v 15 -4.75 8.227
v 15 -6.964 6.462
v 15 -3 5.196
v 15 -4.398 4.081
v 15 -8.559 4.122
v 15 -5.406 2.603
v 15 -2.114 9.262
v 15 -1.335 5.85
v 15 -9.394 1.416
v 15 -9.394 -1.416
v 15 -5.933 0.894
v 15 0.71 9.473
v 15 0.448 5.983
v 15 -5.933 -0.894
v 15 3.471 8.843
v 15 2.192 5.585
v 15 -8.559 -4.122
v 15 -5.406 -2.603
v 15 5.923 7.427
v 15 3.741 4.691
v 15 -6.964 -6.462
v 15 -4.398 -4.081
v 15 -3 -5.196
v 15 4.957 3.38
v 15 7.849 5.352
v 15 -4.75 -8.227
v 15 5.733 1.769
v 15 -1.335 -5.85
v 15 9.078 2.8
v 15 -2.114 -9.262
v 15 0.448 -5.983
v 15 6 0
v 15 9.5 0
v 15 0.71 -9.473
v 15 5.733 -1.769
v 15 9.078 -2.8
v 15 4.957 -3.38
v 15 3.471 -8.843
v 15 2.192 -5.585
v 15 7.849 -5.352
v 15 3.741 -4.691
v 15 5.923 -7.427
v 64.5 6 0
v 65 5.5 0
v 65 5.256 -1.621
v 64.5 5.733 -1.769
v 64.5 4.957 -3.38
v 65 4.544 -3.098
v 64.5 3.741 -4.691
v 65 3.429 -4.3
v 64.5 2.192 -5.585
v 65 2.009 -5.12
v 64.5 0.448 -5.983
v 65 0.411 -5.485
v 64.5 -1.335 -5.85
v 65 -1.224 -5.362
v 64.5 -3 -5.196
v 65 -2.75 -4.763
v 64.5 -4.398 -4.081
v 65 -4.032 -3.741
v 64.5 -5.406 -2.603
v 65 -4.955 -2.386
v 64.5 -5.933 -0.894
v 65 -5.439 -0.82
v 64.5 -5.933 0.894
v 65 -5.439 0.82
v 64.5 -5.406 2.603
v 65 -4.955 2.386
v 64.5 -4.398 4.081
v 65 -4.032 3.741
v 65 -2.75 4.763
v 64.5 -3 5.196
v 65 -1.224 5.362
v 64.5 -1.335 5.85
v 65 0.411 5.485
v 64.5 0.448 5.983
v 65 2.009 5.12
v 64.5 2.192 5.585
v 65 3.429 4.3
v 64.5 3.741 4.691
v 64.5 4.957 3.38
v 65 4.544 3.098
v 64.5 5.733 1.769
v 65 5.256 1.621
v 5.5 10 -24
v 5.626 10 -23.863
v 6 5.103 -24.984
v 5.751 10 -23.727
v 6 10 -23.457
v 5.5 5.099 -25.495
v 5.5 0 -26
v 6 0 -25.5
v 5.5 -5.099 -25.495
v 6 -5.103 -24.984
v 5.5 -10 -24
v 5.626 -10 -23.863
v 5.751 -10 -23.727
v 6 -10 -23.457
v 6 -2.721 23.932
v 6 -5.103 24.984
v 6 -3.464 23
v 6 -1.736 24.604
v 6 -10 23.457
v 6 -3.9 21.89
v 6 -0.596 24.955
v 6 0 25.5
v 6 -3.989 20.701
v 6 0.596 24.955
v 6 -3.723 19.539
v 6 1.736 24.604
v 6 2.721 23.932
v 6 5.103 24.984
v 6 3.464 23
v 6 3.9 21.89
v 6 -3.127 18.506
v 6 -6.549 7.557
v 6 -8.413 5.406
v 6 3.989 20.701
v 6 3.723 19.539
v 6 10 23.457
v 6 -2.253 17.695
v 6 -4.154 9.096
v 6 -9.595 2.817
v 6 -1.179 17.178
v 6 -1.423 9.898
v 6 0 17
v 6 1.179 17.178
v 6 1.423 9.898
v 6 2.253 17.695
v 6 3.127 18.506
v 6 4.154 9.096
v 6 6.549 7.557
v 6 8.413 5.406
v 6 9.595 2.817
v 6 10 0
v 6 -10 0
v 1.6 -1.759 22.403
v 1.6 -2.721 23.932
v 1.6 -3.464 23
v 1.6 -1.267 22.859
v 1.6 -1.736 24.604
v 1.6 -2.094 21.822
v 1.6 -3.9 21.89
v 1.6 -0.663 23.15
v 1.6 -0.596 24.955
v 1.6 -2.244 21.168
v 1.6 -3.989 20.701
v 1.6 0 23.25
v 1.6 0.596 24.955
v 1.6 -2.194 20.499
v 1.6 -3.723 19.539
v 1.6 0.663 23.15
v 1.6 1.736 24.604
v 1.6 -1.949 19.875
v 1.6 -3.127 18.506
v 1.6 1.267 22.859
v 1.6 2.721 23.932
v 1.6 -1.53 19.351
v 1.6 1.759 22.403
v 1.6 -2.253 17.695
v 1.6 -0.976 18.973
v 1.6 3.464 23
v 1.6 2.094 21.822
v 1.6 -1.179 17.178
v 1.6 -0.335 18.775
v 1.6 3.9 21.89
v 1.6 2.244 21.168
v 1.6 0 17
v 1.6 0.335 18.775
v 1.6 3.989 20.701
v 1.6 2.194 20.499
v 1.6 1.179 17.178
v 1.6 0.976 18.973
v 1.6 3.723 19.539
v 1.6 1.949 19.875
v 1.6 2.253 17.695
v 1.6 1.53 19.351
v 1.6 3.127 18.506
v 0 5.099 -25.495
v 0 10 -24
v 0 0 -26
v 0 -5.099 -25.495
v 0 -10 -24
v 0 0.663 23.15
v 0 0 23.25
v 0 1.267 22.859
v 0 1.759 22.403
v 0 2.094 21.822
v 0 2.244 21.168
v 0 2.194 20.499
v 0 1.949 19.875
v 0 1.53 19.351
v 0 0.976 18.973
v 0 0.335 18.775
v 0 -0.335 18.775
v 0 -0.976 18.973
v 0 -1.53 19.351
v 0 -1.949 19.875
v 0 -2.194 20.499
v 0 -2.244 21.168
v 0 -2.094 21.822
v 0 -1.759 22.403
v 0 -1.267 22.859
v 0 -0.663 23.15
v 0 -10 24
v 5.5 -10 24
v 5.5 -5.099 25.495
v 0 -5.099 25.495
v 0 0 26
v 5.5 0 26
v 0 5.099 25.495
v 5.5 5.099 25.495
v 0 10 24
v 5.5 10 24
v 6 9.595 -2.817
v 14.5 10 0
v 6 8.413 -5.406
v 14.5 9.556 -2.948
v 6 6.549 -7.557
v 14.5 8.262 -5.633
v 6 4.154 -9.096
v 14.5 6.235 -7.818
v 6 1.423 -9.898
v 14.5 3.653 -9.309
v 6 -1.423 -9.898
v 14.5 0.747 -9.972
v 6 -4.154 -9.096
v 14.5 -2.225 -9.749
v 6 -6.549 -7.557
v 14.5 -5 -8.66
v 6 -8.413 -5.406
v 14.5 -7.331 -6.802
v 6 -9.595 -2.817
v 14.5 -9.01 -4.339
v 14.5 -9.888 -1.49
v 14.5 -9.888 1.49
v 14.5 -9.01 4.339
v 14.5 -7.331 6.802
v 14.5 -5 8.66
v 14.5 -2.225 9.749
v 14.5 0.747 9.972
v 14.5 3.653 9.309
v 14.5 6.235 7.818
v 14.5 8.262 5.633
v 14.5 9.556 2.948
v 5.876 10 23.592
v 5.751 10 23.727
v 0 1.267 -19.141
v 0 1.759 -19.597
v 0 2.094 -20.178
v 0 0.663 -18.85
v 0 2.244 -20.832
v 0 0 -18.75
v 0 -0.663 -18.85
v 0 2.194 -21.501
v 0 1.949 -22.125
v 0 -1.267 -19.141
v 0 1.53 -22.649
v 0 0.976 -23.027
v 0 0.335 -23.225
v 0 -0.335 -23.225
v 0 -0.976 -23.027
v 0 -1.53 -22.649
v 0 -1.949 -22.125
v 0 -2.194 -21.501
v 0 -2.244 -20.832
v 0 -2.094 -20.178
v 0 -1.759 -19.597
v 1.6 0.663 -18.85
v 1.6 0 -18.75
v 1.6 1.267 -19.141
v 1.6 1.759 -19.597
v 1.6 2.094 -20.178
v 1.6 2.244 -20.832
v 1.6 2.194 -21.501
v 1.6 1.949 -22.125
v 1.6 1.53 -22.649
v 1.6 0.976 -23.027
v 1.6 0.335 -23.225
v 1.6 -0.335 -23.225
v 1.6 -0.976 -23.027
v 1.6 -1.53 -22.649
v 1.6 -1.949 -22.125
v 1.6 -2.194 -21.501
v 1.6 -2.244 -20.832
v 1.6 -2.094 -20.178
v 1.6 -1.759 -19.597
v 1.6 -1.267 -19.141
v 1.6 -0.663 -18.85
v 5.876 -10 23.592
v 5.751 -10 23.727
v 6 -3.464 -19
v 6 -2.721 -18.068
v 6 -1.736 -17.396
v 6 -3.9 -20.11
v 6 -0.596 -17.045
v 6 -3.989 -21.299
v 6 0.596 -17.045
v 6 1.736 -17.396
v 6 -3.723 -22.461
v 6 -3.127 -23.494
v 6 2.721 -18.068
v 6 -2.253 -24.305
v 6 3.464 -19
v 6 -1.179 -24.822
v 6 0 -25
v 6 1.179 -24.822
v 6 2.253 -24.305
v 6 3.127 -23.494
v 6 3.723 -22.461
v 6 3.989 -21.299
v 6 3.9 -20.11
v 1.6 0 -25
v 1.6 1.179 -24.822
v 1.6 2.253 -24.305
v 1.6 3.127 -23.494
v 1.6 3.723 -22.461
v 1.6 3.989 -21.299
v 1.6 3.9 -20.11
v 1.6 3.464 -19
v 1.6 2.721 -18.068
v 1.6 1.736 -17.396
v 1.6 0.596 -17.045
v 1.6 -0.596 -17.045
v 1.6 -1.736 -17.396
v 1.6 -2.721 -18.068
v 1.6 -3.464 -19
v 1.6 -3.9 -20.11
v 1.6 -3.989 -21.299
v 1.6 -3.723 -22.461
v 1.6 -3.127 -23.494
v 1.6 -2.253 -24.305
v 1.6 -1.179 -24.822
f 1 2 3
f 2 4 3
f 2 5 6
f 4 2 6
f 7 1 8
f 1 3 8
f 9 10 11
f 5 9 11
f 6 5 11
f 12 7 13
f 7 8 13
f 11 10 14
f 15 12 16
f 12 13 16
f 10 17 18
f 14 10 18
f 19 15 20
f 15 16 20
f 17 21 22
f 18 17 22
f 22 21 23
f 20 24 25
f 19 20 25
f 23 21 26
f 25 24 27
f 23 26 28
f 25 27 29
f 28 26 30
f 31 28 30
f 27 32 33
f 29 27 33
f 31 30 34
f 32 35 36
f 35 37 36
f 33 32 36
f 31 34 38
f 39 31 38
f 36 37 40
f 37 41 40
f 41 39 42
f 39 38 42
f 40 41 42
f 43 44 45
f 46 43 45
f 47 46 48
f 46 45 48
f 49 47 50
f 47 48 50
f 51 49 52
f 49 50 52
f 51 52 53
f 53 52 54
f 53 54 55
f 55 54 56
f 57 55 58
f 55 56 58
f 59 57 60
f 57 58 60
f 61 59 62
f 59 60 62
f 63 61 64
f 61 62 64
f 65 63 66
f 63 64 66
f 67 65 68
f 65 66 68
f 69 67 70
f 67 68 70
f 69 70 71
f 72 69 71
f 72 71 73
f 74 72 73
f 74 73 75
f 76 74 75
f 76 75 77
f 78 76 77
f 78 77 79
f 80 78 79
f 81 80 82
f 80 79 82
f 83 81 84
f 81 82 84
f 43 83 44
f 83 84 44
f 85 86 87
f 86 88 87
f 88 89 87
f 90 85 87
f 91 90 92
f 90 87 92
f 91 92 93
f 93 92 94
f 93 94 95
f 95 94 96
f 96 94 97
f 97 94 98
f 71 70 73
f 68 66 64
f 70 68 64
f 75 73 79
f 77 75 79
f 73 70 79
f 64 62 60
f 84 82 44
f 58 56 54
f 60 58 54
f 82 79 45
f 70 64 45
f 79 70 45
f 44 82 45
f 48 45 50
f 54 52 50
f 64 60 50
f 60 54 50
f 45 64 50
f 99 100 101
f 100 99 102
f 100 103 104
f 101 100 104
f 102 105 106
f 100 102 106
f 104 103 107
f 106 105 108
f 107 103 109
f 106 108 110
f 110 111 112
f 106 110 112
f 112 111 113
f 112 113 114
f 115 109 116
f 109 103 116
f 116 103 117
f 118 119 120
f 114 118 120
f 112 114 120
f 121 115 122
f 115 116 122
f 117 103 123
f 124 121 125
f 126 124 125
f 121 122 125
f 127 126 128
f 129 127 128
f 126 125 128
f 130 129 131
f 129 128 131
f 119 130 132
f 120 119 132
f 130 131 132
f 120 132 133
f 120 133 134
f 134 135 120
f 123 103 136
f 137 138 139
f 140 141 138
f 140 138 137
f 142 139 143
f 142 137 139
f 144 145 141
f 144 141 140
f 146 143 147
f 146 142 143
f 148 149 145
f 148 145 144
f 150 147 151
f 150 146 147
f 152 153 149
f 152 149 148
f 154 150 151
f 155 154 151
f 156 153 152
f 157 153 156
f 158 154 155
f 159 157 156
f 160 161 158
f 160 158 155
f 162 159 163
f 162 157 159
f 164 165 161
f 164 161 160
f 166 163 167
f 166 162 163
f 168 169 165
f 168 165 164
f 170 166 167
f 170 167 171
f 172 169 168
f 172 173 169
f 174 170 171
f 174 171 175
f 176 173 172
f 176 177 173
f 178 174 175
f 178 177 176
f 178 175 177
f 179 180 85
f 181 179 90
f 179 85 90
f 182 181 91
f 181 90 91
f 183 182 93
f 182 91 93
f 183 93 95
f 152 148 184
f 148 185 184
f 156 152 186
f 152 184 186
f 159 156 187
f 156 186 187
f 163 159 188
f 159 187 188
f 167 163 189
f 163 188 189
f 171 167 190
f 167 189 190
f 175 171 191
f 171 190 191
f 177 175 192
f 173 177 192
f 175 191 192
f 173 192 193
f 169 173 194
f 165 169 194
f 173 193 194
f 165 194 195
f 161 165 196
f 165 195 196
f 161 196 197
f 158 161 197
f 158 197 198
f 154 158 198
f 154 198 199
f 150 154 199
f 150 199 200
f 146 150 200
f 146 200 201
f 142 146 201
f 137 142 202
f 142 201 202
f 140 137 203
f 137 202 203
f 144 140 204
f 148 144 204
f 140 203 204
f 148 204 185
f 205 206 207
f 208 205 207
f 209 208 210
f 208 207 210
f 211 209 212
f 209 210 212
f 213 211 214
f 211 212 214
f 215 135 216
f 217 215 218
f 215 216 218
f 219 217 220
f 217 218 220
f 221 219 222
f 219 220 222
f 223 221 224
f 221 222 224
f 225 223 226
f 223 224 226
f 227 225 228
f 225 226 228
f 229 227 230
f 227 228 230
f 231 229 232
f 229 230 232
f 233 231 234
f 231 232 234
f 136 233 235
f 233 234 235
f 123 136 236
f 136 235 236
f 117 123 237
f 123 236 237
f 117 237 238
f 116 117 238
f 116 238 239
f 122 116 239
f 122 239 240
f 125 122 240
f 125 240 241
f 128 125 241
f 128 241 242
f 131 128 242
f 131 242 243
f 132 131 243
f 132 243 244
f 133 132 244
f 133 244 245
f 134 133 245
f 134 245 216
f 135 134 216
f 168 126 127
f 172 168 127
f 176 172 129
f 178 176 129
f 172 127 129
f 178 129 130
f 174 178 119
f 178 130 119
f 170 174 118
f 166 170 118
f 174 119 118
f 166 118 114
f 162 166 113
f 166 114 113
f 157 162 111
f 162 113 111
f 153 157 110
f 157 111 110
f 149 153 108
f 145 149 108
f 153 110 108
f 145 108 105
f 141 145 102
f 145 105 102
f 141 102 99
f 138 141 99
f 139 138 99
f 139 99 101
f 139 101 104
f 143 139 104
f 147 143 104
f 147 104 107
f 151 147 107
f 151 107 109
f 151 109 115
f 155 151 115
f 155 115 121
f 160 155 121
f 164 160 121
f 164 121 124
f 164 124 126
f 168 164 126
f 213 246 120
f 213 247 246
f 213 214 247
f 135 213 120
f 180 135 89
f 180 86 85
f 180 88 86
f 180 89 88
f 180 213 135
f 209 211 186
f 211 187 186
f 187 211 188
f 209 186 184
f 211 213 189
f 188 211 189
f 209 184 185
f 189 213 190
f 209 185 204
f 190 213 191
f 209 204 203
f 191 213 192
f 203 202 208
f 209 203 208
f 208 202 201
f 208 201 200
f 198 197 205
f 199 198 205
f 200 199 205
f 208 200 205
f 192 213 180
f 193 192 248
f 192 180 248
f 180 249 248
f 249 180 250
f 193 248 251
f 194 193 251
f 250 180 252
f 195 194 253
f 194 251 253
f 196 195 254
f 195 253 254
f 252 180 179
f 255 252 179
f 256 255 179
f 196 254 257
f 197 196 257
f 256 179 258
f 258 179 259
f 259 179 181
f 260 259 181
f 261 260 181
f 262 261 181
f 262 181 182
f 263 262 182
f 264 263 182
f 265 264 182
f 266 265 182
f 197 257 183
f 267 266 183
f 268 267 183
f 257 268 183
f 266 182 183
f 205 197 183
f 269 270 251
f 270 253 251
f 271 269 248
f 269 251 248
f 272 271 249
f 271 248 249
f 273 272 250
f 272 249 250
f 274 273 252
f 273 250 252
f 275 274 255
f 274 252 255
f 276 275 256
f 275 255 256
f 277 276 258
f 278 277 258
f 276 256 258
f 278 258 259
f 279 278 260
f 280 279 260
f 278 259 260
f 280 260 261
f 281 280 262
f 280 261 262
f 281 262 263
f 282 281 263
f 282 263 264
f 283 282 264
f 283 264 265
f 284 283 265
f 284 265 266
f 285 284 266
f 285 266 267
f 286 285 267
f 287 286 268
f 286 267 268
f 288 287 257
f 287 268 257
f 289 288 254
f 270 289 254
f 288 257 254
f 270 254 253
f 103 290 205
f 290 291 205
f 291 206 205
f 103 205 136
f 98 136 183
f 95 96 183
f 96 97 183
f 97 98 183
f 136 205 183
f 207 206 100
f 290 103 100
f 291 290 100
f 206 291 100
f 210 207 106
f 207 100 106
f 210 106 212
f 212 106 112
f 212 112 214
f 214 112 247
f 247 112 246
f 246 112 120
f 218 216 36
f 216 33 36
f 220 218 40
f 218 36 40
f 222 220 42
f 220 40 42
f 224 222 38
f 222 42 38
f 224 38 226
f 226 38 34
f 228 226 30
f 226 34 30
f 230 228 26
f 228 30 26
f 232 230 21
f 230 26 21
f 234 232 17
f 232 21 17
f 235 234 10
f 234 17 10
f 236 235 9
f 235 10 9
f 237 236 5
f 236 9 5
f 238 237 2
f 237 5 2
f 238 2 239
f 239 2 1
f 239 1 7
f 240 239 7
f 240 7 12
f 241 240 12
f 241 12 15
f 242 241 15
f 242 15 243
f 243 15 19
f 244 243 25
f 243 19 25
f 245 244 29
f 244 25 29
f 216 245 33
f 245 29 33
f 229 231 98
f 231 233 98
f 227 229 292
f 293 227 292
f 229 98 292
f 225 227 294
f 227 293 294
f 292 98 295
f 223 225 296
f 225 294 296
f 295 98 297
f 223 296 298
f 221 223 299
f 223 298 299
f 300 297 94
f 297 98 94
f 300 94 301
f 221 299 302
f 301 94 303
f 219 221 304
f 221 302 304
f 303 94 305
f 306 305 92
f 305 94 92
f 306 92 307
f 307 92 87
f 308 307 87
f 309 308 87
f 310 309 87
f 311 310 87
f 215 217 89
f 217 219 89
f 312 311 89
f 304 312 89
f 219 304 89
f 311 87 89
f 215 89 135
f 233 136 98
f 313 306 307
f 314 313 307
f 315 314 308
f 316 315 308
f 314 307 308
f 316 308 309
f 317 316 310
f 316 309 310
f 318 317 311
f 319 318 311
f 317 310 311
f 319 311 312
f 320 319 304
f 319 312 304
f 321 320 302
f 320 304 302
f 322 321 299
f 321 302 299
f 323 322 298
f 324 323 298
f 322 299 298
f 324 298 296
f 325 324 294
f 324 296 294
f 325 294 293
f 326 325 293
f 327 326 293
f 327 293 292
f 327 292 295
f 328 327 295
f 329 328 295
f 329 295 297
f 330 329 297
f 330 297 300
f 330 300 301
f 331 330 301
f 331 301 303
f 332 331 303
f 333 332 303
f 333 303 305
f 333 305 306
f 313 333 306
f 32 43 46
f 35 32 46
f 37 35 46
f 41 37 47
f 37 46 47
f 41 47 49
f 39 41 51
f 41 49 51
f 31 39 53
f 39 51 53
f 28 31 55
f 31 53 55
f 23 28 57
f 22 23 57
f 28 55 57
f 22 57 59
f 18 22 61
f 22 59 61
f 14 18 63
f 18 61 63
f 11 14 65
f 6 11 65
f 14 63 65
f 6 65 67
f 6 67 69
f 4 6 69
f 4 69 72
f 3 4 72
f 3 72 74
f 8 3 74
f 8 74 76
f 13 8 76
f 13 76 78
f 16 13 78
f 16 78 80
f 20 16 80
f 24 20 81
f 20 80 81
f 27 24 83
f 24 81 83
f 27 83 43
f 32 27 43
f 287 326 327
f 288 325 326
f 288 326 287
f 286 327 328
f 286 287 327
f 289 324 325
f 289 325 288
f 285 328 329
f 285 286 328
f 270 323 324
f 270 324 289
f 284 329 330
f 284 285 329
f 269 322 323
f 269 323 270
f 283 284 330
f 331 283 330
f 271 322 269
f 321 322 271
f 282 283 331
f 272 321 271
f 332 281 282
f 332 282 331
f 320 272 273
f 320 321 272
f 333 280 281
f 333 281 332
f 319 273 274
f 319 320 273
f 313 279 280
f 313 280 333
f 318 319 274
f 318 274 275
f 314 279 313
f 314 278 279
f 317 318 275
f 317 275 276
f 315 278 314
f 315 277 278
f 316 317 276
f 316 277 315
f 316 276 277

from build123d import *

# Parameters (mm, degrees)
CHANFREIN1_SIZE                                    = 0.5
CHAMBRAGE_POUR_VIS_T_TE_HEXAGONALE_M41_D           = 4.5
CHAMBRAGE_POUR_VIS_T_TE_HEXAGONALE_M41_CBORE_D     = 8
CHAMBRAGE_POUR_VIS_T_TE_HEXAGONALE_M41_CBORE_DEPTH = 4.4
ENL_V_MAT_EXTRU_2_DEPTH                            = 75.679314405
CHANFREIN3_SIZE                                    = 0.5


with BuildPart() as part:
    # Esquisse1 → Révolution1 (revolve)
    with BuildSketch(Plane.XY):
        Polygon((15, 6), (65, 6), (65, 0), (0, 0), (0, 26), (6, 26), (6, 10), (15, 10), align=None)
    revolve(axis=Axis((65, 0, 0), (-1, 0, 0)))

    # Chanfrein1
    chanfrein1_edges = [part.edges().sort_by_distance(p)[0] for p in [
        (6, -26, 0),
        (15, -10, 0),
    ]]
    chamfer(chanfrein1_edges, length=CHANFREIN1_SIZE)

    # Chambrage pour vis à tête hexagonale M41 (through all)
    with Locations(Plane(origin=(6, 0, 0), x_dir=(0, 0, -1), z_dir=(1, 0, 0))):
        with Locations((-21, 0), (21, 0)):
            CounterBoreHole(CHAMBRAGE_POUR_VIS_T_TE_HEXAGONALE_M41_D / 2, CHAMBRAGE_POUR_VIS_T_TE_HEXAGONALE_M41_CBORE_D / 2, CHAMBRAGE_POUR_VIS_T_TE_HEXAGONALE_M41_CBORE_DEPTH)

    # Esquisse11 → Enlèv. mat.-Extru.2 (cut, through all)
    with BuildSketch(Plane.ZY):
        with BuildLine():
            Line((24, -10), (-24, -10))
            ThreePointArc((-24, -10), (0, -26), (24, -10))
        make_face()
        with BuildLine():
            Line((24, 10), (-24, 10))
            ThreePointArc((-24, 10), (0, 26), (24, 10))
        make_face()
    extrude(amount=-ENL_V_MAT_EXTRU_2_DEPTH, mode=Mode.SUBTRACT)

    # Chanfrein3
    chanfrein3_edges = [part.edges().sort_by_distance(p)[0] for p in [
        (65, -6, 0),
    ]]
    chamfer(chanfrein3_edges, length=CHANFREIN3_SIZE)


solid = part.part
